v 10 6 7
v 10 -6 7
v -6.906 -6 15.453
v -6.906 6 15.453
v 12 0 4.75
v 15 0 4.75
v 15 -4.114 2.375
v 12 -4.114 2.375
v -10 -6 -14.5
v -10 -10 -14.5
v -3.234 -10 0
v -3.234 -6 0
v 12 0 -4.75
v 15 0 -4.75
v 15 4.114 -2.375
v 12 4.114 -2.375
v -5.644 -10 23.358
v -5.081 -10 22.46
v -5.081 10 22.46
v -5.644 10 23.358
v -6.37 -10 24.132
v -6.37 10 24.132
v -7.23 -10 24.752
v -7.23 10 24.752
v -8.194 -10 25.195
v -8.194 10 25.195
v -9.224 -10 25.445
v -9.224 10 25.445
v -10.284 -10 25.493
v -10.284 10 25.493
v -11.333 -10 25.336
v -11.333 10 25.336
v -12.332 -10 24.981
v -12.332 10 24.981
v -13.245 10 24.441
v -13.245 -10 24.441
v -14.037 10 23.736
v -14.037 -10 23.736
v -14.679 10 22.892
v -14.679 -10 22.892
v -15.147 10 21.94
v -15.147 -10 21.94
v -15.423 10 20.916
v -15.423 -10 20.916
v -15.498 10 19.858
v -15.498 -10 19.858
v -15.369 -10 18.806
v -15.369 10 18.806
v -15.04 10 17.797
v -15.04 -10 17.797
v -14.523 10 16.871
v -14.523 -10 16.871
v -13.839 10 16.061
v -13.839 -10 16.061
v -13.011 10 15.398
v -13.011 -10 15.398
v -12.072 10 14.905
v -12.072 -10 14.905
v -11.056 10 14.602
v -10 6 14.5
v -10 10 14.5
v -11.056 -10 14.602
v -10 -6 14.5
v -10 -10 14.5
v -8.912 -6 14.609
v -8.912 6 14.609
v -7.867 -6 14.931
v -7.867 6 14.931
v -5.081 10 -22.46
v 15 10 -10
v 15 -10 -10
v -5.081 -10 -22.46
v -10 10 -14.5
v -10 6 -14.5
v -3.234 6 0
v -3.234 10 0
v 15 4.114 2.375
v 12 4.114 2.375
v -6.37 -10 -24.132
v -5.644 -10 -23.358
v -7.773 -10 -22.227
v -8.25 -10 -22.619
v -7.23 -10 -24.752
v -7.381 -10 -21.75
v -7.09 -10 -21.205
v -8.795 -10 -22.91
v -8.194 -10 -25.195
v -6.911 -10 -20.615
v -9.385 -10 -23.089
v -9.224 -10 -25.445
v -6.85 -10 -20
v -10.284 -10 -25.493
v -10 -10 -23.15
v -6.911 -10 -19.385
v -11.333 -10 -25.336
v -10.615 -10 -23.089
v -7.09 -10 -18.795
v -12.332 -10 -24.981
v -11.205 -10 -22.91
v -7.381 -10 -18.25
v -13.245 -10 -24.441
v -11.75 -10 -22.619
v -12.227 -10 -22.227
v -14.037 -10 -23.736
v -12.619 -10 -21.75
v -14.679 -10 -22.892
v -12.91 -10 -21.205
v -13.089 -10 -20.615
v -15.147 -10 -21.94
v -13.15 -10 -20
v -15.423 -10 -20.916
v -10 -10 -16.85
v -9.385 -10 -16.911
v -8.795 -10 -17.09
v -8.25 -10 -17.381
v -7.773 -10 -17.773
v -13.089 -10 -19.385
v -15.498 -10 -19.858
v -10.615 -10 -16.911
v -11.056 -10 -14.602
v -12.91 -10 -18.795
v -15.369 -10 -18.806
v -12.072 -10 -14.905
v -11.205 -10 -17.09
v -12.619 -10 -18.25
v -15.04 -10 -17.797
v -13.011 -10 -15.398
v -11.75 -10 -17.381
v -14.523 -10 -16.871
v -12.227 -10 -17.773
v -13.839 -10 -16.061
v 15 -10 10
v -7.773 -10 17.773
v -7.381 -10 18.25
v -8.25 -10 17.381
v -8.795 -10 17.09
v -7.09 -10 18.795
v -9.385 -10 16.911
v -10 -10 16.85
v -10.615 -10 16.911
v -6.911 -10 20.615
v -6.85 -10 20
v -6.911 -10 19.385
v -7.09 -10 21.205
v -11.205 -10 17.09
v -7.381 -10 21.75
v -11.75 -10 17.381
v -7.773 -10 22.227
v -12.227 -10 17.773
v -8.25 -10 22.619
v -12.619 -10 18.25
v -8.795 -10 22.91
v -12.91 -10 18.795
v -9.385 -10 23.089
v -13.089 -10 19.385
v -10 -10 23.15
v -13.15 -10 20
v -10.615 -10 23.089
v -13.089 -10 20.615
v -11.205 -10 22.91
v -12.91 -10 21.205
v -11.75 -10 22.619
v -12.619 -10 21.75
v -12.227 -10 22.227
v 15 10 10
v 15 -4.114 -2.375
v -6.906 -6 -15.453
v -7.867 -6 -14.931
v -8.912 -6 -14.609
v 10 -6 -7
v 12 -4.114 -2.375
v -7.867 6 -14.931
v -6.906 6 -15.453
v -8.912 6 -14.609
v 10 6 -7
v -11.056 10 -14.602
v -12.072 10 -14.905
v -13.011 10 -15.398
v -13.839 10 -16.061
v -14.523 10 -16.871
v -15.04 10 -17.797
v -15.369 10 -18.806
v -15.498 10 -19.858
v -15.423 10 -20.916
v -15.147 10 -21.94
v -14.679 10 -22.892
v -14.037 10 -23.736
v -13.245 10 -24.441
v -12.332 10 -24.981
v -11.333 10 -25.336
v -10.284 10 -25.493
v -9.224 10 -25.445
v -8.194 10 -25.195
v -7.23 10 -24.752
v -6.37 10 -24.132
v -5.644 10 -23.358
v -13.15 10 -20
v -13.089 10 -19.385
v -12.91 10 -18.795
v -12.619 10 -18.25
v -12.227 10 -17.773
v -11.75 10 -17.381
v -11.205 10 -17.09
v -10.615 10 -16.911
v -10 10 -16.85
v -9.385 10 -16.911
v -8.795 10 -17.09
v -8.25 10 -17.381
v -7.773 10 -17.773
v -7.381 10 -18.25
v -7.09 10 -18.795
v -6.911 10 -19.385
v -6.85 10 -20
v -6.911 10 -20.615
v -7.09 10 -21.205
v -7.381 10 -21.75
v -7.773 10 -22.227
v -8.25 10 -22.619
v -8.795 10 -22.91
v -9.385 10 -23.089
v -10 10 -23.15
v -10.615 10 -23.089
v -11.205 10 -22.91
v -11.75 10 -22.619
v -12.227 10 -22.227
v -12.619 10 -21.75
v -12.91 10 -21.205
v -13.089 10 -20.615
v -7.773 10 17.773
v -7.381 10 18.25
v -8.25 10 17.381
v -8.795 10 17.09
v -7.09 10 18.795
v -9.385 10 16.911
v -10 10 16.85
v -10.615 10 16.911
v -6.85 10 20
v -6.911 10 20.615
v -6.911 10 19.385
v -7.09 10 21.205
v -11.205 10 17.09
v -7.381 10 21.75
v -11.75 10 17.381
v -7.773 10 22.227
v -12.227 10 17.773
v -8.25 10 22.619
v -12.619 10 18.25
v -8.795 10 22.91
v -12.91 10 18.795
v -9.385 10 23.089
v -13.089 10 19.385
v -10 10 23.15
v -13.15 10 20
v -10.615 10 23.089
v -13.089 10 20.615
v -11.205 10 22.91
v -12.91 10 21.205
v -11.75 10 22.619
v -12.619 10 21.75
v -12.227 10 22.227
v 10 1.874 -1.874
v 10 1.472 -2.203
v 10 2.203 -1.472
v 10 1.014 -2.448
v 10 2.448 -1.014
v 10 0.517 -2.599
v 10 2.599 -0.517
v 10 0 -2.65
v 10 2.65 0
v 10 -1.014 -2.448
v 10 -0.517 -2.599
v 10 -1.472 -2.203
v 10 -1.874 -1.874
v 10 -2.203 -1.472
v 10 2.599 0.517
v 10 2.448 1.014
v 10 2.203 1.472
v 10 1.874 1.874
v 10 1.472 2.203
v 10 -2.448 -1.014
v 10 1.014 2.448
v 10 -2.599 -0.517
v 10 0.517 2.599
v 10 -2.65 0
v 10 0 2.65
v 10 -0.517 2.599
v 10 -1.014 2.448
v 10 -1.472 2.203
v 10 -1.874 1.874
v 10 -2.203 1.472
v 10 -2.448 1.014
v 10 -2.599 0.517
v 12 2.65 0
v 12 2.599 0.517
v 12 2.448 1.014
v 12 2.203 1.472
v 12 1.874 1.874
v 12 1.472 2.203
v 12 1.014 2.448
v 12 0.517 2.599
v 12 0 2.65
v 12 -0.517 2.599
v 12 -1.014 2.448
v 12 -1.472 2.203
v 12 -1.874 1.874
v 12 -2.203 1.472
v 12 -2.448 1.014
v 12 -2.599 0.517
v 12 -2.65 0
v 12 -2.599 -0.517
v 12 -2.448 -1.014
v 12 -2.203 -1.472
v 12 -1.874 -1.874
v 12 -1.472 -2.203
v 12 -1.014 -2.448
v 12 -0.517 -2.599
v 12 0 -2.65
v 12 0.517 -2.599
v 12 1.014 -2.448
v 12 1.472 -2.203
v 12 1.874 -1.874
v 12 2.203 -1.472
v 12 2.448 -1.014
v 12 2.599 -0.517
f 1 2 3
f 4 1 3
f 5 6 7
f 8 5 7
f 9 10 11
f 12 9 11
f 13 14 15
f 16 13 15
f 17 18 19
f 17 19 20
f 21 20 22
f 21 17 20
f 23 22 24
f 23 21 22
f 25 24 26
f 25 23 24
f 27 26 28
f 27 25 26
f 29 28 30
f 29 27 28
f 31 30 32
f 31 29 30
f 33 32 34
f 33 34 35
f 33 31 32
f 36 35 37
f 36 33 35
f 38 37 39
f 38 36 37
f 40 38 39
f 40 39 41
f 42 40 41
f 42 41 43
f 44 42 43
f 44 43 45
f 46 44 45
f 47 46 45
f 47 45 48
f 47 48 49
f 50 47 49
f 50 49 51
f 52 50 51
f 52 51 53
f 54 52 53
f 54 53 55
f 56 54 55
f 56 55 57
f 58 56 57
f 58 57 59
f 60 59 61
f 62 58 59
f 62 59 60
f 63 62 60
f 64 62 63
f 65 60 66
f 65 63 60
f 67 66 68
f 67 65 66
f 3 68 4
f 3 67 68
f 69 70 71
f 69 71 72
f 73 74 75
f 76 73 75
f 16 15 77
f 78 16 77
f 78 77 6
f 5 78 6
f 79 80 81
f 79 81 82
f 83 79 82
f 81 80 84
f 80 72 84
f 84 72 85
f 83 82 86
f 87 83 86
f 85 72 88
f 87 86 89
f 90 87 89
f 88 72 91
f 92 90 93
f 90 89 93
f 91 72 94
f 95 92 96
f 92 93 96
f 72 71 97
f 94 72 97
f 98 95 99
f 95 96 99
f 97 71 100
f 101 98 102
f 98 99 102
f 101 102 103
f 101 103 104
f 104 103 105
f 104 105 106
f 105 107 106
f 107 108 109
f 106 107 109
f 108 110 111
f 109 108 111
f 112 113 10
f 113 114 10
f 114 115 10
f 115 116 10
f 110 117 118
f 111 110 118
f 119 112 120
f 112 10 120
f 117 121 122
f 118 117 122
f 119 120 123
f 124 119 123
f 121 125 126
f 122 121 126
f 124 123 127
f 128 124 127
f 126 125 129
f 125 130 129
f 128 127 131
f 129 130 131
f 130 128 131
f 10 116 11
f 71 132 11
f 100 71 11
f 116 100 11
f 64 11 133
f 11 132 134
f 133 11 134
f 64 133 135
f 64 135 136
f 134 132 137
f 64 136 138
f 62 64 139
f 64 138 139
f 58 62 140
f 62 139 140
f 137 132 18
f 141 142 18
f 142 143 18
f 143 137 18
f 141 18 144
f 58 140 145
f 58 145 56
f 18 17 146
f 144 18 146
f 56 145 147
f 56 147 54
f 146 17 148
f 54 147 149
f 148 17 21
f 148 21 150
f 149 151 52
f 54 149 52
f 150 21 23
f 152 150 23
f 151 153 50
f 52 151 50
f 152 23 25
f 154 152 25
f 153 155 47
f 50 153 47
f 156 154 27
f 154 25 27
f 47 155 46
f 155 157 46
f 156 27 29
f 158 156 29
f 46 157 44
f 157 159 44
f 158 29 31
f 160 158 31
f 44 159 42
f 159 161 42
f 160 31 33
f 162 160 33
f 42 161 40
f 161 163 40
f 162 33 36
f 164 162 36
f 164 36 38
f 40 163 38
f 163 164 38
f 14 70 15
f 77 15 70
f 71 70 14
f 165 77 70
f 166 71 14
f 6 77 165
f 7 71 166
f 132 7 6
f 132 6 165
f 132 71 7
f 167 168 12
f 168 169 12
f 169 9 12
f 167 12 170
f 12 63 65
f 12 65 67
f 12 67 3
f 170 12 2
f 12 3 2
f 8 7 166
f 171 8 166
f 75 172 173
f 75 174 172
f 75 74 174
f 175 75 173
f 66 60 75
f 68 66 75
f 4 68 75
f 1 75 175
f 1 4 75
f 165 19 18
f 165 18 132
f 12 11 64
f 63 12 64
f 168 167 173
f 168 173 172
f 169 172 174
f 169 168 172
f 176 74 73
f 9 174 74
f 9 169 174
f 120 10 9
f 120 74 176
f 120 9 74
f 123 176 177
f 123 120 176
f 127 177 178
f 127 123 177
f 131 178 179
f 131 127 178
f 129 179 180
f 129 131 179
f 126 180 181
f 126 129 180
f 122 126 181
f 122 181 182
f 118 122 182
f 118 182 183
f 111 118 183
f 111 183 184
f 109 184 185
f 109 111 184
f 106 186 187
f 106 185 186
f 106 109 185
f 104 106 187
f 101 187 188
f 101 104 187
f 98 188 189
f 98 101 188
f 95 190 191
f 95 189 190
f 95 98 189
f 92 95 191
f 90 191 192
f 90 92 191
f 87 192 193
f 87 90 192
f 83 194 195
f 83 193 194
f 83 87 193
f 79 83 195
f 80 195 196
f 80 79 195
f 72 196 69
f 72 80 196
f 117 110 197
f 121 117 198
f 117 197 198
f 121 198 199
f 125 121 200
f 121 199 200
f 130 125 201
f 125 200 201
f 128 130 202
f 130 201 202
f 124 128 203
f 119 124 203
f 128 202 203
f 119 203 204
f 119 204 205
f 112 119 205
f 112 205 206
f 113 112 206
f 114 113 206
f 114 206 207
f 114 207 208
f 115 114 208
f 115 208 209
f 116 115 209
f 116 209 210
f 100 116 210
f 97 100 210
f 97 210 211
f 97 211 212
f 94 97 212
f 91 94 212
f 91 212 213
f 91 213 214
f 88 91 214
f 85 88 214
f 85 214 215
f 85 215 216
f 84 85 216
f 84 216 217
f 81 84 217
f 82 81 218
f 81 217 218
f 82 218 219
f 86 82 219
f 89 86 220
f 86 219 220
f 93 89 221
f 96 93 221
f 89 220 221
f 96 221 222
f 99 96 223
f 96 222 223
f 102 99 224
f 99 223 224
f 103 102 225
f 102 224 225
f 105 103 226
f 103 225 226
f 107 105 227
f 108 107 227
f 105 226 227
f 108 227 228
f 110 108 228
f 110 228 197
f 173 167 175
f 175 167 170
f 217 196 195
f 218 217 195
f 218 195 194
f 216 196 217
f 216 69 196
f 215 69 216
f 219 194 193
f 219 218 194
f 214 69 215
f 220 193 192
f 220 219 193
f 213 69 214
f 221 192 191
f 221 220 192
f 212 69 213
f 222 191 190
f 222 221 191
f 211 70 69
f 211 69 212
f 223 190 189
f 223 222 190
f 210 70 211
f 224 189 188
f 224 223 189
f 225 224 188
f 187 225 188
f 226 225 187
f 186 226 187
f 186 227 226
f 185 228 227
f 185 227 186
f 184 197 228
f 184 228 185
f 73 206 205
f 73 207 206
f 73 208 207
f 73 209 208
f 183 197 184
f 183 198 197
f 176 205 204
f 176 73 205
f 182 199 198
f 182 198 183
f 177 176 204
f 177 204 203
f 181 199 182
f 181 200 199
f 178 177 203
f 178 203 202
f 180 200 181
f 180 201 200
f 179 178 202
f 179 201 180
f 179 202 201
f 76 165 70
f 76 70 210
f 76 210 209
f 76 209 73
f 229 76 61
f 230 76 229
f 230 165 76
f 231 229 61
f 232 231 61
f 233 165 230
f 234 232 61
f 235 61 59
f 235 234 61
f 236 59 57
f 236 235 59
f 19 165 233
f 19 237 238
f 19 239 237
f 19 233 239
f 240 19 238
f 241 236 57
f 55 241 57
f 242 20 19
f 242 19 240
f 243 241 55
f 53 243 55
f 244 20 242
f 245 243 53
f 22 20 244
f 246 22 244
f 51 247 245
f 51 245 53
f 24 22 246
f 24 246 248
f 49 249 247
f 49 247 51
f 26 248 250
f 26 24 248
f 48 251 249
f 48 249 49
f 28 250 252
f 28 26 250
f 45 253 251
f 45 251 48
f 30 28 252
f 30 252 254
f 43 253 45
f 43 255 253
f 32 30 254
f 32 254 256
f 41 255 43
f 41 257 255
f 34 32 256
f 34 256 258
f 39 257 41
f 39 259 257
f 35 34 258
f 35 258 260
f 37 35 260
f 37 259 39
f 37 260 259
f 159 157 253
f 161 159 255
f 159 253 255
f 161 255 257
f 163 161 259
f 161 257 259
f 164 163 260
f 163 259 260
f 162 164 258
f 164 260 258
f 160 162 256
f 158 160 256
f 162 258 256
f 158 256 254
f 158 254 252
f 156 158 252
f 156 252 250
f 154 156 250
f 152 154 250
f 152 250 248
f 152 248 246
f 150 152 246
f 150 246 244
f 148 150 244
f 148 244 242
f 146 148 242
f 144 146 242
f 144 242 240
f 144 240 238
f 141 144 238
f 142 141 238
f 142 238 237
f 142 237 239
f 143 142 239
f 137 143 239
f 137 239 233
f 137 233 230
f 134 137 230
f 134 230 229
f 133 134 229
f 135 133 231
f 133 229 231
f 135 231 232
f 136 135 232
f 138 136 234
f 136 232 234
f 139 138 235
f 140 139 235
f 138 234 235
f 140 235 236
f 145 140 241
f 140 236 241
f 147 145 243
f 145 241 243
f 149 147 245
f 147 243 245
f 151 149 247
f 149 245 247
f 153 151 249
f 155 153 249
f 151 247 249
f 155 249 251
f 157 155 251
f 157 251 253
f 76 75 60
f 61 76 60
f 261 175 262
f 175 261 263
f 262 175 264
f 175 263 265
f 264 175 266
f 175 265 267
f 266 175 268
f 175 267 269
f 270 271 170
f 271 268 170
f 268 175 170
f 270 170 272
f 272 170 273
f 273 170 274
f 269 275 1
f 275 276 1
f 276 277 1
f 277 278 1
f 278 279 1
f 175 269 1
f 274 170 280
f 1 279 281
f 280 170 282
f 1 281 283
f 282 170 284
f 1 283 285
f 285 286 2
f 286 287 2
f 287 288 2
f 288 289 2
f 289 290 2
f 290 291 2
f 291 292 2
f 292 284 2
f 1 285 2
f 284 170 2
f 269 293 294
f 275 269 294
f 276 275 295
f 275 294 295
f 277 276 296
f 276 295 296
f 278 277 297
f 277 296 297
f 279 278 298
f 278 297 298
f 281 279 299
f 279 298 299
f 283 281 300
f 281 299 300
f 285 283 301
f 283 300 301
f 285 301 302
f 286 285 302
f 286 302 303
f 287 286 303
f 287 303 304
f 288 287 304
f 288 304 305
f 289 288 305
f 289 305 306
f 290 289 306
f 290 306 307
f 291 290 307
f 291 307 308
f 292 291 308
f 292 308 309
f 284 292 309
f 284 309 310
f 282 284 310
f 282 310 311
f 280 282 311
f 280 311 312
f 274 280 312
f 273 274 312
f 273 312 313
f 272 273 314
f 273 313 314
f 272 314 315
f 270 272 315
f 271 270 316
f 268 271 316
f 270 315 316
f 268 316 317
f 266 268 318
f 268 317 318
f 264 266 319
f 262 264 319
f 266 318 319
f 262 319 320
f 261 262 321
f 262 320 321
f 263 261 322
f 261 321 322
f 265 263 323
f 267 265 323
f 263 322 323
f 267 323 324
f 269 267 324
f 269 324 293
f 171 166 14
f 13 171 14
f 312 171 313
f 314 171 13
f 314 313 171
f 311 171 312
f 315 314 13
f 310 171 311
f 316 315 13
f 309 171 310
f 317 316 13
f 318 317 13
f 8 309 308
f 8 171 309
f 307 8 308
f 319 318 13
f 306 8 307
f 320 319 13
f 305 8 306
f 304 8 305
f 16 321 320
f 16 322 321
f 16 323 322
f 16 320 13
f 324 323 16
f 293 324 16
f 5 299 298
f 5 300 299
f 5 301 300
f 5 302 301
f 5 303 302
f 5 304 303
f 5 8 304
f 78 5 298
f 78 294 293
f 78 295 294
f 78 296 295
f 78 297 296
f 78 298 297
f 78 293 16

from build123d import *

# Parameters (mm, degrees)
F1_DEPTH  = 10
F2_W      = 5
F2_H      = 20
F3_DEPTH  = 20
F5_DEPTH  = 3
F8_DEPTH  = 12
F9_R      = 5.5
F10_DEPTH = 20
F11_R     = 2.65
F12_DEPTH = 25
F13_R     = 3.15
F14_DEPTH = 25
F16_DEPTH = 20
F18_DEPTH = 25


with BuildPart() as f1:
    # F0 (on Front) → F1 (new body, symmetric)
    with BuildSketch(Plane.XZ):
        Polygon((-10, 20), (-10, -20), (10, -10), (10, 10), align=None)
    extrude(amount=F1_DEPTH, both=True)

    # F2 (on face) → F3 (join, through all)
    with BuildSketch(Plane.XZ.offset(10)):
        with Locations((12.5, 0)):
            Rectangle(F2_W, F2_H)
    extrude(amount=-F3_DEPTH)

    # F4 (on face) → F5 (cut)
    with BuildSketch(Plane.YZ.offset(15)):
        Polygon((0, -4.75), (4.113620668, -2.375), (4.113620668, 2.375), (0, 4.75), (-4.1136206679, 2.375), (-4.1136206679, -2.375), align=None)
    extrude(amount=-F5_DEPTH, mode=Mode.SUBTRACT)

    # F7 (on offset) → F8 (cut, through all)
    with BuildSketch(Plane.XZ.offset(6)):
        Polygon((-10, 17), (-10, -17), (10, -7), (10, 7), align=None)
    extrude(amount=-F8_DEPTH, mode=Mode.SUBTRACT)

    # F9 (on face) → F10 (join, through all)
    with BuildSketch(Plane.XZ.offset(10)):
        with Locations((-10, 20)):
            Circle(F9_R)
        with Locations((-10, -20)):
            Circle(F9_R)
    extrude(amount=-F10_DEPTH)

    # F11 (on face) → F12 (cut)
    with BuildSketch(Plane.YZ.offset(12)):
        Circle(F11_R)
    extrude(amount=-F12_DEPTH, mode=Mode.SUBTRACT)

    # F13 (on face) → F14 (cut)
    with BuildSketch(Plane(origin=(0, 10, 0), x_dir=(-1, 0, 0), z_dir=(0, 1, 0))):
        with Locations((10, -20)):
            Circle(F13_R)
        with Locations((10, 20)):
            Circle(F13_R)
    extrude(amount=-F14_DEPTH, mode=Mode.SUBTRACT)

    # F15 (on face) → F16 (join, through all)
    with BuildSketch(Plane(origin=(0, 10, 0), x_dir=(-1, 0, 0), z_dir=(0, 1, 0))):
        Polygon((-10, 10), (5.0806504495, 17.5403252248), (5.0806504495, 22.4596747752), (-15, 10), align=None)
        Polygon((5.0806504495, -22.4596747752), (5.0806504495, -17.5403252248), (-10, -10), (-15, -10), align=None)
    extrude(amount=-F16_DEPTH)

    # F17 (on face) → F18 (cut)
    with BuildSketch(Plane.XZ.offset(10)):
        Polygon((-3.2343349885, 0), (-10, 14.5), (-10, -14.5), align=None)
    extrude(amount=-F18_DEPTH, mode=Mode.SUBTRACT)


solid = f1.part
